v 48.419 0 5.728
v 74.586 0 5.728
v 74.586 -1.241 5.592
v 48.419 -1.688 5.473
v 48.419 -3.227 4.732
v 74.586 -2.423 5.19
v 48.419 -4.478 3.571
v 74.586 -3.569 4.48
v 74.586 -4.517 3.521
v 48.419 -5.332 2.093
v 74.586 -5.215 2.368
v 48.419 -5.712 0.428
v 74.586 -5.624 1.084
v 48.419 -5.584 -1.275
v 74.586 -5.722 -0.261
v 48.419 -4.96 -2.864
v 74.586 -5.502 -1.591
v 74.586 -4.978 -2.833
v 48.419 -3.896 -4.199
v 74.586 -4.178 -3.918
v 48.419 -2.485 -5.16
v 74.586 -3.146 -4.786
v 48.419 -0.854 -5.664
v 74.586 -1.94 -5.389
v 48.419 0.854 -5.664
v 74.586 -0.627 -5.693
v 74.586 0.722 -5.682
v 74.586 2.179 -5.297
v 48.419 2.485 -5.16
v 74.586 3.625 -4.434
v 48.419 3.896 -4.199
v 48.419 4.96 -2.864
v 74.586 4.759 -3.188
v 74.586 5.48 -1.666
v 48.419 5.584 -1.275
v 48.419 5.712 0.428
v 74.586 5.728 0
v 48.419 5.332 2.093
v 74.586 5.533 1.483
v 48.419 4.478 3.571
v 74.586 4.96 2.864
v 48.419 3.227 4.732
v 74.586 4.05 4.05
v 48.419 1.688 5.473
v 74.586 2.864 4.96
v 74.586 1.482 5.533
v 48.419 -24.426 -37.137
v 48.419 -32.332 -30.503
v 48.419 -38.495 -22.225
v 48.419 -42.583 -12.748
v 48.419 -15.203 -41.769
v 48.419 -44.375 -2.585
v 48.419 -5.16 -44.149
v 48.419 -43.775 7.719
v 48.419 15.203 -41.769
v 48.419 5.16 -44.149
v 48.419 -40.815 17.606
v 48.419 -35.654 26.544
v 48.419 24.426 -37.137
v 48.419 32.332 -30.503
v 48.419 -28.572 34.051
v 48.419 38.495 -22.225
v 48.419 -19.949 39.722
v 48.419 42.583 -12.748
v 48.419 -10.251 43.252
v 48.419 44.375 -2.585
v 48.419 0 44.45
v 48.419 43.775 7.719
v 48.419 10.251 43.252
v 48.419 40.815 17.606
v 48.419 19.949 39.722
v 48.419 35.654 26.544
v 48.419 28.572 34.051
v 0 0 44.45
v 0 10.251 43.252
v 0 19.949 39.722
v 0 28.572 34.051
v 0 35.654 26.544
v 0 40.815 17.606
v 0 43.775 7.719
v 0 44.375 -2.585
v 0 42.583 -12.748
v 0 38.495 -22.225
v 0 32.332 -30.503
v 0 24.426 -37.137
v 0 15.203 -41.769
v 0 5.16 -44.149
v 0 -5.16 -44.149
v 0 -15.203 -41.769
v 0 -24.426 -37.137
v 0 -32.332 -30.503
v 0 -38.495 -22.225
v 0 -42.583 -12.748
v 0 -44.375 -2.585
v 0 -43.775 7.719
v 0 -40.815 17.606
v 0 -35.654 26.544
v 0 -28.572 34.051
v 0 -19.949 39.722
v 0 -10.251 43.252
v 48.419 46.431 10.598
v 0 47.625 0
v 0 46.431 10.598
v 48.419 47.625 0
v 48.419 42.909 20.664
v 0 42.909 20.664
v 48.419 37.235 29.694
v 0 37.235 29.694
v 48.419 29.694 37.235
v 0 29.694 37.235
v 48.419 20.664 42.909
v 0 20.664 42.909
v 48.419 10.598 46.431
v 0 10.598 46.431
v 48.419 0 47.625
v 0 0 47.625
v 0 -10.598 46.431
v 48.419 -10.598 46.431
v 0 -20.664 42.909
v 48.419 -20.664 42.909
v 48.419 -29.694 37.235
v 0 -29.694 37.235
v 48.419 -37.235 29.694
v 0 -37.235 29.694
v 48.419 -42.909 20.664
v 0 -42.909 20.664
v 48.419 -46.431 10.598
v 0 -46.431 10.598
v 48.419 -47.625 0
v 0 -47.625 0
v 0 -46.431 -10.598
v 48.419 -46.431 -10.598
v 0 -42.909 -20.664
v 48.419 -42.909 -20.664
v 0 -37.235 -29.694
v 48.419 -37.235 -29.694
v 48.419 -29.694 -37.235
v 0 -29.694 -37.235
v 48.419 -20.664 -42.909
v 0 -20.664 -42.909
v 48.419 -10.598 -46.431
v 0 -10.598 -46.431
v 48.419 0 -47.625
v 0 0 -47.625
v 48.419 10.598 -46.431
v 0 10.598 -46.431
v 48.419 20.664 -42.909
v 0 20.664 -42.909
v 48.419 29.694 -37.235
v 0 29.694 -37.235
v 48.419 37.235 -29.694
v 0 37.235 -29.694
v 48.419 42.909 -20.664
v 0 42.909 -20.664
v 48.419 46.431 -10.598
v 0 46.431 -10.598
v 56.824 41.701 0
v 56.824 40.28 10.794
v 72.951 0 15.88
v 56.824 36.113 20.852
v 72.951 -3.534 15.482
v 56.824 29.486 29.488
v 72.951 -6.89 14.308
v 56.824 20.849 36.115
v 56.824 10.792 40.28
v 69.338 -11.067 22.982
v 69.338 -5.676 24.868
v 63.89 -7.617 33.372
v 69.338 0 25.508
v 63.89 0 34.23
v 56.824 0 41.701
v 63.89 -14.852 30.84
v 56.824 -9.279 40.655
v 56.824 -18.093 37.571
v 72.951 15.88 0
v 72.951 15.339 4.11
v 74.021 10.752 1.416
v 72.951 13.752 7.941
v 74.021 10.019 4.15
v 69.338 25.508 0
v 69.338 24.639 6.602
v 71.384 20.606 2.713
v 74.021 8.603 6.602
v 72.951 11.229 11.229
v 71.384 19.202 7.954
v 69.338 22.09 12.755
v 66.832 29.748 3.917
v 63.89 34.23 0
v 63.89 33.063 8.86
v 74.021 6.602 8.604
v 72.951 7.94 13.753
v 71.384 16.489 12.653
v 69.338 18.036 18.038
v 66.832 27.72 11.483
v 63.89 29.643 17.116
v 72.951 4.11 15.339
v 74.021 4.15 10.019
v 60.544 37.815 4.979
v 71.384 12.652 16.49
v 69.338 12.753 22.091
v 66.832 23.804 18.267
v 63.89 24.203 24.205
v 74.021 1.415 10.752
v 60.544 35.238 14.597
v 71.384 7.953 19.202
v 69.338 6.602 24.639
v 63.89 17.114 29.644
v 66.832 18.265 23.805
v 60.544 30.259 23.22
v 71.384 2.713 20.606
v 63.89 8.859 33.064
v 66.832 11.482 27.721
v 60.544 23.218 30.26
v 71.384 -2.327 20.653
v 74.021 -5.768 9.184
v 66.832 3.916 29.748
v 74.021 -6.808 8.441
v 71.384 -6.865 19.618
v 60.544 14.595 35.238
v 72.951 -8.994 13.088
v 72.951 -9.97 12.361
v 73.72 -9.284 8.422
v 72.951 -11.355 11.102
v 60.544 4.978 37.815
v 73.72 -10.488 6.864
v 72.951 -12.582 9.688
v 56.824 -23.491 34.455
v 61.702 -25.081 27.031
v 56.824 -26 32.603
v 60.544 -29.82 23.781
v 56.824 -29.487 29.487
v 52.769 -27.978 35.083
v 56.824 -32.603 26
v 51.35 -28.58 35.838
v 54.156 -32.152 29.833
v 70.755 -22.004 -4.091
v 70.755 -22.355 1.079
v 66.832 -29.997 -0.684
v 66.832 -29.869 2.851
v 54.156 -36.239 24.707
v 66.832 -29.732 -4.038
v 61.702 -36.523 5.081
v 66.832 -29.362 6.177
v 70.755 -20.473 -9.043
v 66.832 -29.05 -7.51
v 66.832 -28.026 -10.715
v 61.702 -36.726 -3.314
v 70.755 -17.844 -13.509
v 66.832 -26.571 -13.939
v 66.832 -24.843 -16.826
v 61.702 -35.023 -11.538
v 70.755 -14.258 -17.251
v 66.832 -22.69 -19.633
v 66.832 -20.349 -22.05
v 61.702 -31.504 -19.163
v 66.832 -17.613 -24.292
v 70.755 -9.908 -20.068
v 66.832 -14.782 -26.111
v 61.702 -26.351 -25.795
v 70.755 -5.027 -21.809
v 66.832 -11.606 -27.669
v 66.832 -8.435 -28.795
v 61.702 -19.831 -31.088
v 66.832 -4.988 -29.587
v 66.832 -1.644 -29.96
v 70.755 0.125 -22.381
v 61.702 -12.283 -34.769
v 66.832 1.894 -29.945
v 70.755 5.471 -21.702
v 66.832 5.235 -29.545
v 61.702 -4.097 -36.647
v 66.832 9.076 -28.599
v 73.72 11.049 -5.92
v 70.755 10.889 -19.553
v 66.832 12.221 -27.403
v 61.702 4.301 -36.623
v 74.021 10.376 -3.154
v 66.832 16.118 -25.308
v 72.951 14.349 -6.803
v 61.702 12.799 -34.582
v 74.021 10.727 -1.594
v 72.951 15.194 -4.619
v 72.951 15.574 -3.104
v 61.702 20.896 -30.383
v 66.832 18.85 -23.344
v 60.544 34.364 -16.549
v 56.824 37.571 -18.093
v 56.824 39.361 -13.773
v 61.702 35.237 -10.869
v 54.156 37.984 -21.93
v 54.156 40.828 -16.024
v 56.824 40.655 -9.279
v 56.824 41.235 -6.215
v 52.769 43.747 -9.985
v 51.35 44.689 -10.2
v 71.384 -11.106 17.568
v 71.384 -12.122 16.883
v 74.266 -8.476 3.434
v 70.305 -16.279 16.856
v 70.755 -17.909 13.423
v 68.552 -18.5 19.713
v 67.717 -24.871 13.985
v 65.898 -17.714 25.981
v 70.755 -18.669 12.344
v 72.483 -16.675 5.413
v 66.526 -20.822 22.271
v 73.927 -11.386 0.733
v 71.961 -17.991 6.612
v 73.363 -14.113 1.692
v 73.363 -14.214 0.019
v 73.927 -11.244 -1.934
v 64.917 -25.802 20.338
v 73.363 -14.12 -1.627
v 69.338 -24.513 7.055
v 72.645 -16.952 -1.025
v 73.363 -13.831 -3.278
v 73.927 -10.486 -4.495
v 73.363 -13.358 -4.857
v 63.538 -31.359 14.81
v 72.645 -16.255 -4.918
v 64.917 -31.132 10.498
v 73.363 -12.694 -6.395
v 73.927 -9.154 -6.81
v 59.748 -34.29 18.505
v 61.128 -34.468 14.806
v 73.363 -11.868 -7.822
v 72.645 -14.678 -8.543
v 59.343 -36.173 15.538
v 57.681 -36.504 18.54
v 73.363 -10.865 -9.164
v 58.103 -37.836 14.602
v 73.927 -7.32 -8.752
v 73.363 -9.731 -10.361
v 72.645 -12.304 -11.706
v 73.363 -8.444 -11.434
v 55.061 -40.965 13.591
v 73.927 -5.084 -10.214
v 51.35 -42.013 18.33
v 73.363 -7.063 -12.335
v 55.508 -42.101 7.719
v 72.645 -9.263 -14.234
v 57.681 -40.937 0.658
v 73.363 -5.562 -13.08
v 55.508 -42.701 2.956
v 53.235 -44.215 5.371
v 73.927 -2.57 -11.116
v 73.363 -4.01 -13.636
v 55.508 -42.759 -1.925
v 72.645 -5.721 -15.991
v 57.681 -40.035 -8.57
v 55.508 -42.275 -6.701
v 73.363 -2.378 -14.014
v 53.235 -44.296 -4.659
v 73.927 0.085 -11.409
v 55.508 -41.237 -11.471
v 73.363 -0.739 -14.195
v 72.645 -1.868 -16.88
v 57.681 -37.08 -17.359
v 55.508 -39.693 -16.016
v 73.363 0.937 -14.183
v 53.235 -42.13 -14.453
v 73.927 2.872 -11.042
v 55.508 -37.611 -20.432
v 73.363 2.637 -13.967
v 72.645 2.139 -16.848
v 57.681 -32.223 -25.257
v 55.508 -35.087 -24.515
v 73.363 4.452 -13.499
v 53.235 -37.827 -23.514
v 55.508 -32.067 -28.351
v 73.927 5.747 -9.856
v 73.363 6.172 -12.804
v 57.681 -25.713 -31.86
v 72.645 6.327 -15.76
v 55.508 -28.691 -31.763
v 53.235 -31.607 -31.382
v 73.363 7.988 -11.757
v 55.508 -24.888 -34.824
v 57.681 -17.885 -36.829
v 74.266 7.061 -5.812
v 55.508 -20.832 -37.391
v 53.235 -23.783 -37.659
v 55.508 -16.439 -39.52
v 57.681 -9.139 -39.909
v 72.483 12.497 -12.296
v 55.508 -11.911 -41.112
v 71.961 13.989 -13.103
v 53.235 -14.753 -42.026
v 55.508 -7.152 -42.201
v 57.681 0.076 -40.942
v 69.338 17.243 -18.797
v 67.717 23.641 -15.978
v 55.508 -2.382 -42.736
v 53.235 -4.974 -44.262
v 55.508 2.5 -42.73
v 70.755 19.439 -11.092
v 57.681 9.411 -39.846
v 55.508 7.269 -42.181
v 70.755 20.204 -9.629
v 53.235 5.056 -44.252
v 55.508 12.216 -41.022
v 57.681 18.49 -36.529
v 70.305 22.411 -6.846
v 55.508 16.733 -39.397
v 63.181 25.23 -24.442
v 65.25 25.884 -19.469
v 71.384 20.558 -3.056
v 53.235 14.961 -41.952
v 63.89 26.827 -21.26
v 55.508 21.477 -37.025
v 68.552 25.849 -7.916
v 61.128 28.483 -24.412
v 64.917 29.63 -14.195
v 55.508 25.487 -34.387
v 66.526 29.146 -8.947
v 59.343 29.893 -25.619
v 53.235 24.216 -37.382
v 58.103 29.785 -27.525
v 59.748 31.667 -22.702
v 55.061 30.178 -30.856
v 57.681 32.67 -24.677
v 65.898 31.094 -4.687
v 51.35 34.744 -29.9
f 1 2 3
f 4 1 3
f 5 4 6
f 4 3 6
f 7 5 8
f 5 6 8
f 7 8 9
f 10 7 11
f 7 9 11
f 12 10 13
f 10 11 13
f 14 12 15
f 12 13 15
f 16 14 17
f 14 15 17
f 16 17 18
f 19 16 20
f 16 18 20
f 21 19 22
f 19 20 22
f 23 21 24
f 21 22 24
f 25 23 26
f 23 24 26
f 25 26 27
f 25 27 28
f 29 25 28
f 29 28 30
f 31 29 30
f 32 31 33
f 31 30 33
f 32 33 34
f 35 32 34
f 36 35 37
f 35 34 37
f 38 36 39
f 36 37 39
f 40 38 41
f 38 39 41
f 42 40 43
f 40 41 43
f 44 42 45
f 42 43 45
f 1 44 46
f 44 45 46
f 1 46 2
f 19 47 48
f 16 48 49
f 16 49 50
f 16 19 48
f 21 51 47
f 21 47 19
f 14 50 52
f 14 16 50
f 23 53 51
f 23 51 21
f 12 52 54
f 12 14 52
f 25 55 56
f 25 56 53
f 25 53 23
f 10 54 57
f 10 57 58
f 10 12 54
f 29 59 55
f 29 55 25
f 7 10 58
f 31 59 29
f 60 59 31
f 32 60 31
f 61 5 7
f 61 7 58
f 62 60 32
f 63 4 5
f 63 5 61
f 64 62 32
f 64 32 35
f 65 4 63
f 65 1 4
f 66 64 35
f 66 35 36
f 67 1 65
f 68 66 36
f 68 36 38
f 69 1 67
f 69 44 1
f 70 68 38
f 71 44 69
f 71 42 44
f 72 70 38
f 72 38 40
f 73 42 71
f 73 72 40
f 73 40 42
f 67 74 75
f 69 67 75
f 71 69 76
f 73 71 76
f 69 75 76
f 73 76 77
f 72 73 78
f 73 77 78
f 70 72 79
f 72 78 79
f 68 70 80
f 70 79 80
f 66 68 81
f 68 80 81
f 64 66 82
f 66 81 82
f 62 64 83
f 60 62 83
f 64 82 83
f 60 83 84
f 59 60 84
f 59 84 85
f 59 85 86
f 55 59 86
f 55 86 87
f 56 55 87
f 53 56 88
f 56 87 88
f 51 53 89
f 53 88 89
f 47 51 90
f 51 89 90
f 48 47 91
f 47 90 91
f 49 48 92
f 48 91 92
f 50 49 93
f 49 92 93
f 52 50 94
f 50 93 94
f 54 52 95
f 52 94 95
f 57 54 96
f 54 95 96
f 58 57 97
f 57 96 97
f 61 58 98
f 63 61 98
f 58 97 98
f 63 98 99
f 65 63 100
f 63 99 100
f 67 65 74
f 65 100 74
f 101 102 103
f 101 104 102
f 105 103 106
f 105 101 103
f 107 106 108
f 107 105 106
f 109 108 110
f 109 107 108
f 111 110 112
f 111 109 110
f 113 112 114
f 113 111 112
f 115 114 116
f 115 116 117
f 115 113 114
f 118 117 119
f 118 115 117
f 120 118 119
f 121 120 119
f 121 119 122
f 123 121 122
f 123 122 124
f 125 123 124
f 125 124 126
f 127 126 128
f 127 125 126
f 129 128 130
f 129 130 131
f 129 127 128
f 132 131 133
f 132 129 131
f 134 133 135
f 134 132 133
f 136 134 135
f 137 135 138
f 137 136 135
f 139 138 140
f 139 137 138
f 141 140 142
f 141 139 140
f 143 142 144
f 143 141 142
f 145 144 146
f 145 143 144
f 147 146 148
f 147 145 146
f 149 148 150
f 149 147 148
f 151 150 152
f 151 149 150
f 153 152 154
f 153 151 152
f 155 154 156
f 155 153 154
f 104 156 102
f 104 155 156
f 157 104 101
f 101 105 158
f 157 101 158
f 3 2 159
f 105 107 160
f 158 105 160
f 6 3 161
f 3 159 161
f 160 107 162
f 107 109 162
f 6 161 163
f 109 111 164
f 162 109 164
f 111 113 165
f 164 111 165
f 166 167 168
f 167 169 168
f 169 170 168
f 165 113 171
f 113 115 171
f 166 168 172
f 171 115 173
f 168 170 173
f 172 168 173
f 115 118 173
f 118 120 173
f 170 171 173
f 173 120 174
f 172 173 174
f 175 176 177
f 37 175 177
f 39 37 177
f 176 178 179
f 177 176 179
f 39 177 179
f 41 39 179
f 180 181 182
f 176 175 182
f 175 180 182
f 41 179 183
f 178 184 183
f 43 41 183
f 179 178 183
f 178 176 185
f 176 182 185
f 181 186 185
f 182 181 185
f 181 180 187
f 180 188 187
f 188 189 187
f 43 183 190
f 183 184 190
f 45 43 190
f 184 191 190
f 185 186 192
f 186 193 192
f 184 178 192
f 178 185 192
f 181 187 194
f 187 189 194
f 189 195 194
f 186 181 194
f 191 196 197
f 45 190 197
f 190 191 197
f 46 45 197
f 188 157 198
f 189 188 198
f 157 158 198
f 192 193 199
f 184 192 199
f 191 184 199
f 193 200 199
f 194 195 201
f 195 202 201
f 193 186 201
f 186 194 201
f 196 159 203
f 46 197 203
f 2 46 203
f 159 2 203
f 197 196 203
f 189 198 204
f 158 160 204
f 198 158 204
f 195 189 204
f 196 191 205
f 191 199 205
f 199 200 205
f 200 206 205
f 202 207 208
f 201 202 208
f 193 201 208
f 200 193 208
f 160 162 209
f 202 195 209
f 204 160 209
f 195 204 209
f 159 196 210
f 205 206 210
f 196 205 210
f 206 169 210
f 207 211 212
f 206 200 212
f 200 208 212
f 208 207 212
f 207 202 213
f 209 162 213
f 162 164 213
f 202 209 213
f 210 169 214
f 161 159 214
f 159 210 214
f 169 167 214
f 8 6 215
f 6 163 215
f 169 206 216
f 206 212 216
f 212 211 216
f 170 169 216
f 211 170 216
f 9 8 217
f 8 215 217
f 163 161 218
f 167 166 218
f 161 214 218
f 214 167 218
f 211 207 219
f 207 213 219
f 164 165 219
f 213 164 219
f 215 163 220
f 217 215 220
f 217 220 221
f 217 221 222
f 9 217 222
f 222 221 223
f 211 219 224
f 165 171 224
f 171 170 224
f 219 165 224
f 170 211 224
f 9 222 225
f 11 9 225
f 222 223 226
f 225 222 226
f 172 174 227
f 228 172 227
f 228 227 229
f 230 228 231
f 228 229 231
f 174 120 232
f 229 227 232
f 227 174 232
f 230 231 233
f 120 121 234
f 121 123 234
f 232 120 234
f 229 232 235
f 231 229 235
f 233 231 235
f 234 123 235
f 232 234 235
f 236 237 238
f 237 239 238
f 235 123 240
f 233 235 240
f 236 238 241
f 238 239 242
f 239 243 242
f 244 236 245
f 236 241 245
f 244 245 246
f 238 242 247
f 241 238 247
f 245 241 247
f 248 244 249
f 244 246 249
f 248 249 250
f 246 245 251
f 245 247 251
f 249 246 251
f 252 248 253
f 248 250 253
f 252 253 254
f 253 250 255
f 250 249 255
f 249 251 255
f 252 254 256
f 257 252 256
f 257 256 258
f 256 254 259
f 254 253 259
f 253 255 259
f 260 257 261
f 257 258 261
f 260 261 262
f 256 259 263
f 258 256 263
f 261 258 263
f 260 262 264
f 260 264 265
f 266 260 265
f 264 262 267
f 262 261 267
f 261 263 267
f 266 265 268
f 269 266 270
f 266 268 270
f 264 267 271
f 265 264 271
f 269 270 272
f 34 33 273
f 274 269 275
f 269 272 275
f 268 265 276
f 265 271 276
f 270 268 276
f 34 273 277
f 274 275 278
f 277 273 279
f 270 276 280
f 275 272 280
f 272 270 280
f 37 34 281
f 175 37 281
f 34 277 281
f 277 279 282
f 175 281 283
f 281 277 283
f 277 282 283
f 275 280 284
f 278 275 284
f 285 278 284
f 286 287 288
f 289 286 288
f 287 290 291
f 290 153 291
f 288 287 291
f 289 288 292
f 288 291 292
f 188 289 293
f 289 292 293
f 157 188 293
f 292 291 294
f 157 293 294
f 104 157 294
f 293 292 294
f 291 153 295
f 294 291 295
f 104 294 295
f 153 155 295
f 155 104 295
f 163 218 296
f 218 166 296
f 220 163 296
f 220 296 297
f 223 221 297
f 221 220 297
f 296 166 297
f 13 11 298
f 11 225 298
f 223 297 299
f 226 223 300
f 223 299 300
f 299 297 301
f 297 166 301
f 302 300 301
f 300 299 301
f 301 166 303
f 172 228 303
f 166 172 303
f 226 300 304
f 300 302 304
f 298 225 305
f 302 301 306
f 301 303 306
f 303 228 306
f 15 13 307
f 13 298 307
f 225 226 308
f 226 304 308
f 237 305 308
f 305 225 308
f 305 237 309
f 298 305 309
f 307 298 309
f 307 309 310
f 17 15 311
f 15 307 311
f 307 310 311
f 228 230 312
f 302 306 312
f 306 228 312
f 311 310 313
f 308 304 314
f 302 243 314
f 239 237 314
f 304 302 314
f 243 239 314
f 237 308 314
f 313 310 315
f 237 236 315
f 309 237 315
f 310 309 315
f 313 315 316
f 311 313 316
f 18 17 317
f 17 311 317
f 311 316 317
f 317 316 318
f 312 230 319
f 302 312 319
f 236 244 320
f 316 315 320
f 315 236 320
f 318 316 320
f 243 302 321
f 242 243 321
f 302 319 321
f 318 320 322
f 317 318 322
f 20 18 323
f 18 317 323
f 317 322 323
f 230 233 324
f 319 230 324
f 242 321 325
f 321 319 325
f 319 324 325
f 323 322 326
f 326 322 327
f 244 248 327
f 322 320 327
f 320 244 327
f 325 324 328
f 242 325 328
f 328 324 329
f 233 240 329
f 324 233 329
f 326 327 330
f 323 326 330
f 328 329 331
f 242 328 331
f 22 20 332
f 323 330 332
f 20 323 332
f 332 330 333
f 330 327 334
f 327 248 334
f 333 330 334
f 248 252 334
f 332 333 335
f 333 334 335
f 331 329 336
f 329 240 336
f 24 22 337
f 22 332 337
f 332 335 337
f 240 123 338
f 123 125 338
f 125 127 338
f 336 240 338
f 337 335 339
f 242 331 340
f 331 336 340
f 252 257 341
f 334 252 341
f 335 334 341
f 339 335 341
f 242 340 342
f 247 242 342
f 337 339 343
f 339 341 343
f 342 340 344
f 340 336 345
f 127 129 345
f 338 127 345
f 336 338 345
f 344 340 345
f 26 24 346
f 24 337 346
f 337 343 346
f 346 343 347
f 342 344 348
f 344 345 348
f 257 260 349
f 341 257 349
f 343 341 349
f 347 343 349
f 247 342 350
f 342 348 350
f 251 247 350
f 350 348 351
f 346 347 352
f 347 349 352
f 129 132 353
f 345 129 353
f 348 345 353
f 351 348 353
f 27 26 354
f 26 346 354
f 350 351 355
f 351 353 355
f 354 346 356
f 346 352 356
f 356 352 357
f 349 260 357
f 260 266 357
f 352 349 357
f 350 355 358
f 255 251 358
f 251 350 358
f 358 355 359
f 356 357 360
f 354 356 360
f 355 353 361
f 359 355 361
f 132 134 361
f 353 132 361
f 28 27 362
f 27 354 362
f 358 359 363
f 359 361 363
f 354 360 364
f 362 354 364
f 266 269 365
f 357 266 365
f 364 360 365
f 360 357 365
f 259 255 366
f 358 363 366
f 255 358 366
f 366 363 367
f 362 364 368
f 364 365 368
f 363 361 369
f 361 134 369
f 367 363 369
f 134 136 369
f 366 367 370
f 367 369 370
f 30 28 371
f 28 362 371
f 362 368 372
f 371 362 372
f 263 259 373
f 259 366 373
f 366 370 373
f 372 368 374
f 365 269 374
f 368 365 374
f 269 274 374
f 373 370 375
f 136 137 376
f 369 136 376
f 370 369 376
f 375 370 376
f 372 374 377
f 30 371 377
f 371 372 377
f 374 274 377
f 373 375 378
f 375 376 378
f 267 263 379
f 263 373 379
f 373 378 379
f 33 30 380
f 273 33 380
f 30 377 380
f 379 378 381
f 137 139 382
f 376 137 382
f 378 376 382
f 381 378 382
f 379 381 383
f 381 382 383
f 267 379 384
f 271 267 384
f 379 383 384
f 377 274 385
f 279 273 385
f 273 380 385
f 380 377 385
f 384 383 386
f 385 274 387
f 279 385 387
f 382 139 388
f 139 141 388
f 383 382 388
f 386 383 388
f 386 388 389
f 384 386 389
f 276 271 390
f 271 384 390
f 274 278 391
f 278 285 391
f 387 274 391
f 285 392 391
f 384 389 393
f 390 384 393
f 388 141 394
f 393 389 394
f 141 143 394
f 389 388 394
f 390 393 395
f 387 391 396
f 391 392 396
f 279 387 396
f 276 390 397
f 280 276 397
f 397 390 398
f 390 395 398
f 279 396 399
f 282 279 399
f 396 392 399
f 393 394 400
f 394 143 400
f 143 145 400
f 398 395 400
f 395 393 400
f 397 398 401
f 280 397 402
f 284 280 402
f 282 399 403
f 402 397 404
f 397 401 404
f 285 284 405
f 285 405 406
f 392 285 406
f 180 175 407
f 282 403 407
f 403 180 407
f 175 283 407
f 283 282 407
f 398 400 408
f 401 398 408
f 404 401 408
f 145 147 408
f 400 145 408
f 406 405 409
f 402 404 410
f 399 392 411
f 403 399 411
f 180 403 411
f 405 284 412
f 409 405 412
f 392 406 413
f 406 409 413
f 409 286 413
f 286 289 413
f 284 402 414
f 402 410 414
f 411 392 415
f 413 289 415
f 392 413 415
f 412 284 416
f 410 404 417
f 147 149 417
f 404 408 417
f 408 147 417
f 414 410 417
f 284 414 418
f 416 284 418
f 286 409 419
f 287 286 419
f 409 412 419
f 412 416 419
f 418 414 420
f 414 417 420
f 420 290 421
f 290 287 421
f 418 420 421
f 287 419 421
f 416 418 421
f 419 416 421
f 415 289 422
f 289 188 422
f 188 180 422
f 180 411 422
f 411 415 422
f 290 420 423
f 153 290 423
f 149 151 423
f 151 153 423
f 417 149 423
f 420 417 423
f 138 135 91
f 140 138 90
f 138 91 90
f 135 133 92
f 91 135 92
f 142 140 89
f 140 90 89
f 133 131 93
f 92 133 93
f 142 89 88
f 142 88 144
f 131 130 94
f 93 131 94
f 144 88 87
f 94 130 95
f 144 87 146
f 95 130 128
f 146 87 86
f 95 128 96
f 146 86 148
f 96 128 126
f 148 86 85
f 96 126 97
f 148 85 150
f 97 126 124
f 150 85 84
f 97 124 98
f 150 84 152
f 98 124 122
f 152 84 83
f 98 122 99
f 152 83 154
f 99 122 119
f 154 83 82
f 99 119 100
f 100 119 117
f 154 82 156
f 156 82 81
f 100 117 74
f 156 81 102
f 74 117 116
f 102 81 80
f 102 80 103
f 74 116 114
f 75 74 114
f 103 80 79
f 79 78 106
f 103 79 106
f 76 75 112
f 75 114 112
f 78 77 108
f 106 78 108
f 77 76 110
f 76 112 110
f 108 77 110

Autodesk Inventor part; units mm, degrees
ref_plane "YZ Plane" through (0, 0, 0) normal (1, 0, 0) x (0, 1, 0)
ref_plane "XZ Plane" through (0, 0, 0) normal (0, 1, 0) x (-1, 0, 0)
ref_plane "XY Plane" through (0, 0, 0) normal (0, 0, 1) x (1, 0, 0)
sketch "Sketch1" plane through (0, 0, 0) normal (0, 0, 1) x (1, 0, 0)
  line L0 (0, 0) -> (0, 47.625)
  line L1 (0, 47.625) -> (48.4188, 47.625)
  line L2 (0, 0) -> (74.6125, 0)
  arc A0 (74.6125, 0) -> (48.4188, 47.625) centre (22.9932, 2.6252) ccw
  dimension "d0" = 47.625
  dimension "d1" = 48.4188
revolve "Revolution1" add sketch "Sketch1" angle 360 about axis through (0, 0, 0) along (1, 0, 0)
sketch "Sketch2" plane through (0, 0, 0) normal (-1, 0, 0) x (0, 0, 1)
  circle A0 centre (0, 0) radius 44.45
  dimension "d4" = 88.9
extrude "Extrusion1" cut sketch "Sketch2" against normal blind 48.4188
sketch "Sketch3" plane through (48.4188, 0, 0) normal (-1, 0, 0) x (0, 0, 1)
  circle A0 centre (0, 0) radius 3.175
  dimension "d7" = 6.35
hole "Hole1" at (48.4188, 0, 0) direction (1, 0, 0) diameter 11.4554 end through all
properties part number "3inCAPV1"
